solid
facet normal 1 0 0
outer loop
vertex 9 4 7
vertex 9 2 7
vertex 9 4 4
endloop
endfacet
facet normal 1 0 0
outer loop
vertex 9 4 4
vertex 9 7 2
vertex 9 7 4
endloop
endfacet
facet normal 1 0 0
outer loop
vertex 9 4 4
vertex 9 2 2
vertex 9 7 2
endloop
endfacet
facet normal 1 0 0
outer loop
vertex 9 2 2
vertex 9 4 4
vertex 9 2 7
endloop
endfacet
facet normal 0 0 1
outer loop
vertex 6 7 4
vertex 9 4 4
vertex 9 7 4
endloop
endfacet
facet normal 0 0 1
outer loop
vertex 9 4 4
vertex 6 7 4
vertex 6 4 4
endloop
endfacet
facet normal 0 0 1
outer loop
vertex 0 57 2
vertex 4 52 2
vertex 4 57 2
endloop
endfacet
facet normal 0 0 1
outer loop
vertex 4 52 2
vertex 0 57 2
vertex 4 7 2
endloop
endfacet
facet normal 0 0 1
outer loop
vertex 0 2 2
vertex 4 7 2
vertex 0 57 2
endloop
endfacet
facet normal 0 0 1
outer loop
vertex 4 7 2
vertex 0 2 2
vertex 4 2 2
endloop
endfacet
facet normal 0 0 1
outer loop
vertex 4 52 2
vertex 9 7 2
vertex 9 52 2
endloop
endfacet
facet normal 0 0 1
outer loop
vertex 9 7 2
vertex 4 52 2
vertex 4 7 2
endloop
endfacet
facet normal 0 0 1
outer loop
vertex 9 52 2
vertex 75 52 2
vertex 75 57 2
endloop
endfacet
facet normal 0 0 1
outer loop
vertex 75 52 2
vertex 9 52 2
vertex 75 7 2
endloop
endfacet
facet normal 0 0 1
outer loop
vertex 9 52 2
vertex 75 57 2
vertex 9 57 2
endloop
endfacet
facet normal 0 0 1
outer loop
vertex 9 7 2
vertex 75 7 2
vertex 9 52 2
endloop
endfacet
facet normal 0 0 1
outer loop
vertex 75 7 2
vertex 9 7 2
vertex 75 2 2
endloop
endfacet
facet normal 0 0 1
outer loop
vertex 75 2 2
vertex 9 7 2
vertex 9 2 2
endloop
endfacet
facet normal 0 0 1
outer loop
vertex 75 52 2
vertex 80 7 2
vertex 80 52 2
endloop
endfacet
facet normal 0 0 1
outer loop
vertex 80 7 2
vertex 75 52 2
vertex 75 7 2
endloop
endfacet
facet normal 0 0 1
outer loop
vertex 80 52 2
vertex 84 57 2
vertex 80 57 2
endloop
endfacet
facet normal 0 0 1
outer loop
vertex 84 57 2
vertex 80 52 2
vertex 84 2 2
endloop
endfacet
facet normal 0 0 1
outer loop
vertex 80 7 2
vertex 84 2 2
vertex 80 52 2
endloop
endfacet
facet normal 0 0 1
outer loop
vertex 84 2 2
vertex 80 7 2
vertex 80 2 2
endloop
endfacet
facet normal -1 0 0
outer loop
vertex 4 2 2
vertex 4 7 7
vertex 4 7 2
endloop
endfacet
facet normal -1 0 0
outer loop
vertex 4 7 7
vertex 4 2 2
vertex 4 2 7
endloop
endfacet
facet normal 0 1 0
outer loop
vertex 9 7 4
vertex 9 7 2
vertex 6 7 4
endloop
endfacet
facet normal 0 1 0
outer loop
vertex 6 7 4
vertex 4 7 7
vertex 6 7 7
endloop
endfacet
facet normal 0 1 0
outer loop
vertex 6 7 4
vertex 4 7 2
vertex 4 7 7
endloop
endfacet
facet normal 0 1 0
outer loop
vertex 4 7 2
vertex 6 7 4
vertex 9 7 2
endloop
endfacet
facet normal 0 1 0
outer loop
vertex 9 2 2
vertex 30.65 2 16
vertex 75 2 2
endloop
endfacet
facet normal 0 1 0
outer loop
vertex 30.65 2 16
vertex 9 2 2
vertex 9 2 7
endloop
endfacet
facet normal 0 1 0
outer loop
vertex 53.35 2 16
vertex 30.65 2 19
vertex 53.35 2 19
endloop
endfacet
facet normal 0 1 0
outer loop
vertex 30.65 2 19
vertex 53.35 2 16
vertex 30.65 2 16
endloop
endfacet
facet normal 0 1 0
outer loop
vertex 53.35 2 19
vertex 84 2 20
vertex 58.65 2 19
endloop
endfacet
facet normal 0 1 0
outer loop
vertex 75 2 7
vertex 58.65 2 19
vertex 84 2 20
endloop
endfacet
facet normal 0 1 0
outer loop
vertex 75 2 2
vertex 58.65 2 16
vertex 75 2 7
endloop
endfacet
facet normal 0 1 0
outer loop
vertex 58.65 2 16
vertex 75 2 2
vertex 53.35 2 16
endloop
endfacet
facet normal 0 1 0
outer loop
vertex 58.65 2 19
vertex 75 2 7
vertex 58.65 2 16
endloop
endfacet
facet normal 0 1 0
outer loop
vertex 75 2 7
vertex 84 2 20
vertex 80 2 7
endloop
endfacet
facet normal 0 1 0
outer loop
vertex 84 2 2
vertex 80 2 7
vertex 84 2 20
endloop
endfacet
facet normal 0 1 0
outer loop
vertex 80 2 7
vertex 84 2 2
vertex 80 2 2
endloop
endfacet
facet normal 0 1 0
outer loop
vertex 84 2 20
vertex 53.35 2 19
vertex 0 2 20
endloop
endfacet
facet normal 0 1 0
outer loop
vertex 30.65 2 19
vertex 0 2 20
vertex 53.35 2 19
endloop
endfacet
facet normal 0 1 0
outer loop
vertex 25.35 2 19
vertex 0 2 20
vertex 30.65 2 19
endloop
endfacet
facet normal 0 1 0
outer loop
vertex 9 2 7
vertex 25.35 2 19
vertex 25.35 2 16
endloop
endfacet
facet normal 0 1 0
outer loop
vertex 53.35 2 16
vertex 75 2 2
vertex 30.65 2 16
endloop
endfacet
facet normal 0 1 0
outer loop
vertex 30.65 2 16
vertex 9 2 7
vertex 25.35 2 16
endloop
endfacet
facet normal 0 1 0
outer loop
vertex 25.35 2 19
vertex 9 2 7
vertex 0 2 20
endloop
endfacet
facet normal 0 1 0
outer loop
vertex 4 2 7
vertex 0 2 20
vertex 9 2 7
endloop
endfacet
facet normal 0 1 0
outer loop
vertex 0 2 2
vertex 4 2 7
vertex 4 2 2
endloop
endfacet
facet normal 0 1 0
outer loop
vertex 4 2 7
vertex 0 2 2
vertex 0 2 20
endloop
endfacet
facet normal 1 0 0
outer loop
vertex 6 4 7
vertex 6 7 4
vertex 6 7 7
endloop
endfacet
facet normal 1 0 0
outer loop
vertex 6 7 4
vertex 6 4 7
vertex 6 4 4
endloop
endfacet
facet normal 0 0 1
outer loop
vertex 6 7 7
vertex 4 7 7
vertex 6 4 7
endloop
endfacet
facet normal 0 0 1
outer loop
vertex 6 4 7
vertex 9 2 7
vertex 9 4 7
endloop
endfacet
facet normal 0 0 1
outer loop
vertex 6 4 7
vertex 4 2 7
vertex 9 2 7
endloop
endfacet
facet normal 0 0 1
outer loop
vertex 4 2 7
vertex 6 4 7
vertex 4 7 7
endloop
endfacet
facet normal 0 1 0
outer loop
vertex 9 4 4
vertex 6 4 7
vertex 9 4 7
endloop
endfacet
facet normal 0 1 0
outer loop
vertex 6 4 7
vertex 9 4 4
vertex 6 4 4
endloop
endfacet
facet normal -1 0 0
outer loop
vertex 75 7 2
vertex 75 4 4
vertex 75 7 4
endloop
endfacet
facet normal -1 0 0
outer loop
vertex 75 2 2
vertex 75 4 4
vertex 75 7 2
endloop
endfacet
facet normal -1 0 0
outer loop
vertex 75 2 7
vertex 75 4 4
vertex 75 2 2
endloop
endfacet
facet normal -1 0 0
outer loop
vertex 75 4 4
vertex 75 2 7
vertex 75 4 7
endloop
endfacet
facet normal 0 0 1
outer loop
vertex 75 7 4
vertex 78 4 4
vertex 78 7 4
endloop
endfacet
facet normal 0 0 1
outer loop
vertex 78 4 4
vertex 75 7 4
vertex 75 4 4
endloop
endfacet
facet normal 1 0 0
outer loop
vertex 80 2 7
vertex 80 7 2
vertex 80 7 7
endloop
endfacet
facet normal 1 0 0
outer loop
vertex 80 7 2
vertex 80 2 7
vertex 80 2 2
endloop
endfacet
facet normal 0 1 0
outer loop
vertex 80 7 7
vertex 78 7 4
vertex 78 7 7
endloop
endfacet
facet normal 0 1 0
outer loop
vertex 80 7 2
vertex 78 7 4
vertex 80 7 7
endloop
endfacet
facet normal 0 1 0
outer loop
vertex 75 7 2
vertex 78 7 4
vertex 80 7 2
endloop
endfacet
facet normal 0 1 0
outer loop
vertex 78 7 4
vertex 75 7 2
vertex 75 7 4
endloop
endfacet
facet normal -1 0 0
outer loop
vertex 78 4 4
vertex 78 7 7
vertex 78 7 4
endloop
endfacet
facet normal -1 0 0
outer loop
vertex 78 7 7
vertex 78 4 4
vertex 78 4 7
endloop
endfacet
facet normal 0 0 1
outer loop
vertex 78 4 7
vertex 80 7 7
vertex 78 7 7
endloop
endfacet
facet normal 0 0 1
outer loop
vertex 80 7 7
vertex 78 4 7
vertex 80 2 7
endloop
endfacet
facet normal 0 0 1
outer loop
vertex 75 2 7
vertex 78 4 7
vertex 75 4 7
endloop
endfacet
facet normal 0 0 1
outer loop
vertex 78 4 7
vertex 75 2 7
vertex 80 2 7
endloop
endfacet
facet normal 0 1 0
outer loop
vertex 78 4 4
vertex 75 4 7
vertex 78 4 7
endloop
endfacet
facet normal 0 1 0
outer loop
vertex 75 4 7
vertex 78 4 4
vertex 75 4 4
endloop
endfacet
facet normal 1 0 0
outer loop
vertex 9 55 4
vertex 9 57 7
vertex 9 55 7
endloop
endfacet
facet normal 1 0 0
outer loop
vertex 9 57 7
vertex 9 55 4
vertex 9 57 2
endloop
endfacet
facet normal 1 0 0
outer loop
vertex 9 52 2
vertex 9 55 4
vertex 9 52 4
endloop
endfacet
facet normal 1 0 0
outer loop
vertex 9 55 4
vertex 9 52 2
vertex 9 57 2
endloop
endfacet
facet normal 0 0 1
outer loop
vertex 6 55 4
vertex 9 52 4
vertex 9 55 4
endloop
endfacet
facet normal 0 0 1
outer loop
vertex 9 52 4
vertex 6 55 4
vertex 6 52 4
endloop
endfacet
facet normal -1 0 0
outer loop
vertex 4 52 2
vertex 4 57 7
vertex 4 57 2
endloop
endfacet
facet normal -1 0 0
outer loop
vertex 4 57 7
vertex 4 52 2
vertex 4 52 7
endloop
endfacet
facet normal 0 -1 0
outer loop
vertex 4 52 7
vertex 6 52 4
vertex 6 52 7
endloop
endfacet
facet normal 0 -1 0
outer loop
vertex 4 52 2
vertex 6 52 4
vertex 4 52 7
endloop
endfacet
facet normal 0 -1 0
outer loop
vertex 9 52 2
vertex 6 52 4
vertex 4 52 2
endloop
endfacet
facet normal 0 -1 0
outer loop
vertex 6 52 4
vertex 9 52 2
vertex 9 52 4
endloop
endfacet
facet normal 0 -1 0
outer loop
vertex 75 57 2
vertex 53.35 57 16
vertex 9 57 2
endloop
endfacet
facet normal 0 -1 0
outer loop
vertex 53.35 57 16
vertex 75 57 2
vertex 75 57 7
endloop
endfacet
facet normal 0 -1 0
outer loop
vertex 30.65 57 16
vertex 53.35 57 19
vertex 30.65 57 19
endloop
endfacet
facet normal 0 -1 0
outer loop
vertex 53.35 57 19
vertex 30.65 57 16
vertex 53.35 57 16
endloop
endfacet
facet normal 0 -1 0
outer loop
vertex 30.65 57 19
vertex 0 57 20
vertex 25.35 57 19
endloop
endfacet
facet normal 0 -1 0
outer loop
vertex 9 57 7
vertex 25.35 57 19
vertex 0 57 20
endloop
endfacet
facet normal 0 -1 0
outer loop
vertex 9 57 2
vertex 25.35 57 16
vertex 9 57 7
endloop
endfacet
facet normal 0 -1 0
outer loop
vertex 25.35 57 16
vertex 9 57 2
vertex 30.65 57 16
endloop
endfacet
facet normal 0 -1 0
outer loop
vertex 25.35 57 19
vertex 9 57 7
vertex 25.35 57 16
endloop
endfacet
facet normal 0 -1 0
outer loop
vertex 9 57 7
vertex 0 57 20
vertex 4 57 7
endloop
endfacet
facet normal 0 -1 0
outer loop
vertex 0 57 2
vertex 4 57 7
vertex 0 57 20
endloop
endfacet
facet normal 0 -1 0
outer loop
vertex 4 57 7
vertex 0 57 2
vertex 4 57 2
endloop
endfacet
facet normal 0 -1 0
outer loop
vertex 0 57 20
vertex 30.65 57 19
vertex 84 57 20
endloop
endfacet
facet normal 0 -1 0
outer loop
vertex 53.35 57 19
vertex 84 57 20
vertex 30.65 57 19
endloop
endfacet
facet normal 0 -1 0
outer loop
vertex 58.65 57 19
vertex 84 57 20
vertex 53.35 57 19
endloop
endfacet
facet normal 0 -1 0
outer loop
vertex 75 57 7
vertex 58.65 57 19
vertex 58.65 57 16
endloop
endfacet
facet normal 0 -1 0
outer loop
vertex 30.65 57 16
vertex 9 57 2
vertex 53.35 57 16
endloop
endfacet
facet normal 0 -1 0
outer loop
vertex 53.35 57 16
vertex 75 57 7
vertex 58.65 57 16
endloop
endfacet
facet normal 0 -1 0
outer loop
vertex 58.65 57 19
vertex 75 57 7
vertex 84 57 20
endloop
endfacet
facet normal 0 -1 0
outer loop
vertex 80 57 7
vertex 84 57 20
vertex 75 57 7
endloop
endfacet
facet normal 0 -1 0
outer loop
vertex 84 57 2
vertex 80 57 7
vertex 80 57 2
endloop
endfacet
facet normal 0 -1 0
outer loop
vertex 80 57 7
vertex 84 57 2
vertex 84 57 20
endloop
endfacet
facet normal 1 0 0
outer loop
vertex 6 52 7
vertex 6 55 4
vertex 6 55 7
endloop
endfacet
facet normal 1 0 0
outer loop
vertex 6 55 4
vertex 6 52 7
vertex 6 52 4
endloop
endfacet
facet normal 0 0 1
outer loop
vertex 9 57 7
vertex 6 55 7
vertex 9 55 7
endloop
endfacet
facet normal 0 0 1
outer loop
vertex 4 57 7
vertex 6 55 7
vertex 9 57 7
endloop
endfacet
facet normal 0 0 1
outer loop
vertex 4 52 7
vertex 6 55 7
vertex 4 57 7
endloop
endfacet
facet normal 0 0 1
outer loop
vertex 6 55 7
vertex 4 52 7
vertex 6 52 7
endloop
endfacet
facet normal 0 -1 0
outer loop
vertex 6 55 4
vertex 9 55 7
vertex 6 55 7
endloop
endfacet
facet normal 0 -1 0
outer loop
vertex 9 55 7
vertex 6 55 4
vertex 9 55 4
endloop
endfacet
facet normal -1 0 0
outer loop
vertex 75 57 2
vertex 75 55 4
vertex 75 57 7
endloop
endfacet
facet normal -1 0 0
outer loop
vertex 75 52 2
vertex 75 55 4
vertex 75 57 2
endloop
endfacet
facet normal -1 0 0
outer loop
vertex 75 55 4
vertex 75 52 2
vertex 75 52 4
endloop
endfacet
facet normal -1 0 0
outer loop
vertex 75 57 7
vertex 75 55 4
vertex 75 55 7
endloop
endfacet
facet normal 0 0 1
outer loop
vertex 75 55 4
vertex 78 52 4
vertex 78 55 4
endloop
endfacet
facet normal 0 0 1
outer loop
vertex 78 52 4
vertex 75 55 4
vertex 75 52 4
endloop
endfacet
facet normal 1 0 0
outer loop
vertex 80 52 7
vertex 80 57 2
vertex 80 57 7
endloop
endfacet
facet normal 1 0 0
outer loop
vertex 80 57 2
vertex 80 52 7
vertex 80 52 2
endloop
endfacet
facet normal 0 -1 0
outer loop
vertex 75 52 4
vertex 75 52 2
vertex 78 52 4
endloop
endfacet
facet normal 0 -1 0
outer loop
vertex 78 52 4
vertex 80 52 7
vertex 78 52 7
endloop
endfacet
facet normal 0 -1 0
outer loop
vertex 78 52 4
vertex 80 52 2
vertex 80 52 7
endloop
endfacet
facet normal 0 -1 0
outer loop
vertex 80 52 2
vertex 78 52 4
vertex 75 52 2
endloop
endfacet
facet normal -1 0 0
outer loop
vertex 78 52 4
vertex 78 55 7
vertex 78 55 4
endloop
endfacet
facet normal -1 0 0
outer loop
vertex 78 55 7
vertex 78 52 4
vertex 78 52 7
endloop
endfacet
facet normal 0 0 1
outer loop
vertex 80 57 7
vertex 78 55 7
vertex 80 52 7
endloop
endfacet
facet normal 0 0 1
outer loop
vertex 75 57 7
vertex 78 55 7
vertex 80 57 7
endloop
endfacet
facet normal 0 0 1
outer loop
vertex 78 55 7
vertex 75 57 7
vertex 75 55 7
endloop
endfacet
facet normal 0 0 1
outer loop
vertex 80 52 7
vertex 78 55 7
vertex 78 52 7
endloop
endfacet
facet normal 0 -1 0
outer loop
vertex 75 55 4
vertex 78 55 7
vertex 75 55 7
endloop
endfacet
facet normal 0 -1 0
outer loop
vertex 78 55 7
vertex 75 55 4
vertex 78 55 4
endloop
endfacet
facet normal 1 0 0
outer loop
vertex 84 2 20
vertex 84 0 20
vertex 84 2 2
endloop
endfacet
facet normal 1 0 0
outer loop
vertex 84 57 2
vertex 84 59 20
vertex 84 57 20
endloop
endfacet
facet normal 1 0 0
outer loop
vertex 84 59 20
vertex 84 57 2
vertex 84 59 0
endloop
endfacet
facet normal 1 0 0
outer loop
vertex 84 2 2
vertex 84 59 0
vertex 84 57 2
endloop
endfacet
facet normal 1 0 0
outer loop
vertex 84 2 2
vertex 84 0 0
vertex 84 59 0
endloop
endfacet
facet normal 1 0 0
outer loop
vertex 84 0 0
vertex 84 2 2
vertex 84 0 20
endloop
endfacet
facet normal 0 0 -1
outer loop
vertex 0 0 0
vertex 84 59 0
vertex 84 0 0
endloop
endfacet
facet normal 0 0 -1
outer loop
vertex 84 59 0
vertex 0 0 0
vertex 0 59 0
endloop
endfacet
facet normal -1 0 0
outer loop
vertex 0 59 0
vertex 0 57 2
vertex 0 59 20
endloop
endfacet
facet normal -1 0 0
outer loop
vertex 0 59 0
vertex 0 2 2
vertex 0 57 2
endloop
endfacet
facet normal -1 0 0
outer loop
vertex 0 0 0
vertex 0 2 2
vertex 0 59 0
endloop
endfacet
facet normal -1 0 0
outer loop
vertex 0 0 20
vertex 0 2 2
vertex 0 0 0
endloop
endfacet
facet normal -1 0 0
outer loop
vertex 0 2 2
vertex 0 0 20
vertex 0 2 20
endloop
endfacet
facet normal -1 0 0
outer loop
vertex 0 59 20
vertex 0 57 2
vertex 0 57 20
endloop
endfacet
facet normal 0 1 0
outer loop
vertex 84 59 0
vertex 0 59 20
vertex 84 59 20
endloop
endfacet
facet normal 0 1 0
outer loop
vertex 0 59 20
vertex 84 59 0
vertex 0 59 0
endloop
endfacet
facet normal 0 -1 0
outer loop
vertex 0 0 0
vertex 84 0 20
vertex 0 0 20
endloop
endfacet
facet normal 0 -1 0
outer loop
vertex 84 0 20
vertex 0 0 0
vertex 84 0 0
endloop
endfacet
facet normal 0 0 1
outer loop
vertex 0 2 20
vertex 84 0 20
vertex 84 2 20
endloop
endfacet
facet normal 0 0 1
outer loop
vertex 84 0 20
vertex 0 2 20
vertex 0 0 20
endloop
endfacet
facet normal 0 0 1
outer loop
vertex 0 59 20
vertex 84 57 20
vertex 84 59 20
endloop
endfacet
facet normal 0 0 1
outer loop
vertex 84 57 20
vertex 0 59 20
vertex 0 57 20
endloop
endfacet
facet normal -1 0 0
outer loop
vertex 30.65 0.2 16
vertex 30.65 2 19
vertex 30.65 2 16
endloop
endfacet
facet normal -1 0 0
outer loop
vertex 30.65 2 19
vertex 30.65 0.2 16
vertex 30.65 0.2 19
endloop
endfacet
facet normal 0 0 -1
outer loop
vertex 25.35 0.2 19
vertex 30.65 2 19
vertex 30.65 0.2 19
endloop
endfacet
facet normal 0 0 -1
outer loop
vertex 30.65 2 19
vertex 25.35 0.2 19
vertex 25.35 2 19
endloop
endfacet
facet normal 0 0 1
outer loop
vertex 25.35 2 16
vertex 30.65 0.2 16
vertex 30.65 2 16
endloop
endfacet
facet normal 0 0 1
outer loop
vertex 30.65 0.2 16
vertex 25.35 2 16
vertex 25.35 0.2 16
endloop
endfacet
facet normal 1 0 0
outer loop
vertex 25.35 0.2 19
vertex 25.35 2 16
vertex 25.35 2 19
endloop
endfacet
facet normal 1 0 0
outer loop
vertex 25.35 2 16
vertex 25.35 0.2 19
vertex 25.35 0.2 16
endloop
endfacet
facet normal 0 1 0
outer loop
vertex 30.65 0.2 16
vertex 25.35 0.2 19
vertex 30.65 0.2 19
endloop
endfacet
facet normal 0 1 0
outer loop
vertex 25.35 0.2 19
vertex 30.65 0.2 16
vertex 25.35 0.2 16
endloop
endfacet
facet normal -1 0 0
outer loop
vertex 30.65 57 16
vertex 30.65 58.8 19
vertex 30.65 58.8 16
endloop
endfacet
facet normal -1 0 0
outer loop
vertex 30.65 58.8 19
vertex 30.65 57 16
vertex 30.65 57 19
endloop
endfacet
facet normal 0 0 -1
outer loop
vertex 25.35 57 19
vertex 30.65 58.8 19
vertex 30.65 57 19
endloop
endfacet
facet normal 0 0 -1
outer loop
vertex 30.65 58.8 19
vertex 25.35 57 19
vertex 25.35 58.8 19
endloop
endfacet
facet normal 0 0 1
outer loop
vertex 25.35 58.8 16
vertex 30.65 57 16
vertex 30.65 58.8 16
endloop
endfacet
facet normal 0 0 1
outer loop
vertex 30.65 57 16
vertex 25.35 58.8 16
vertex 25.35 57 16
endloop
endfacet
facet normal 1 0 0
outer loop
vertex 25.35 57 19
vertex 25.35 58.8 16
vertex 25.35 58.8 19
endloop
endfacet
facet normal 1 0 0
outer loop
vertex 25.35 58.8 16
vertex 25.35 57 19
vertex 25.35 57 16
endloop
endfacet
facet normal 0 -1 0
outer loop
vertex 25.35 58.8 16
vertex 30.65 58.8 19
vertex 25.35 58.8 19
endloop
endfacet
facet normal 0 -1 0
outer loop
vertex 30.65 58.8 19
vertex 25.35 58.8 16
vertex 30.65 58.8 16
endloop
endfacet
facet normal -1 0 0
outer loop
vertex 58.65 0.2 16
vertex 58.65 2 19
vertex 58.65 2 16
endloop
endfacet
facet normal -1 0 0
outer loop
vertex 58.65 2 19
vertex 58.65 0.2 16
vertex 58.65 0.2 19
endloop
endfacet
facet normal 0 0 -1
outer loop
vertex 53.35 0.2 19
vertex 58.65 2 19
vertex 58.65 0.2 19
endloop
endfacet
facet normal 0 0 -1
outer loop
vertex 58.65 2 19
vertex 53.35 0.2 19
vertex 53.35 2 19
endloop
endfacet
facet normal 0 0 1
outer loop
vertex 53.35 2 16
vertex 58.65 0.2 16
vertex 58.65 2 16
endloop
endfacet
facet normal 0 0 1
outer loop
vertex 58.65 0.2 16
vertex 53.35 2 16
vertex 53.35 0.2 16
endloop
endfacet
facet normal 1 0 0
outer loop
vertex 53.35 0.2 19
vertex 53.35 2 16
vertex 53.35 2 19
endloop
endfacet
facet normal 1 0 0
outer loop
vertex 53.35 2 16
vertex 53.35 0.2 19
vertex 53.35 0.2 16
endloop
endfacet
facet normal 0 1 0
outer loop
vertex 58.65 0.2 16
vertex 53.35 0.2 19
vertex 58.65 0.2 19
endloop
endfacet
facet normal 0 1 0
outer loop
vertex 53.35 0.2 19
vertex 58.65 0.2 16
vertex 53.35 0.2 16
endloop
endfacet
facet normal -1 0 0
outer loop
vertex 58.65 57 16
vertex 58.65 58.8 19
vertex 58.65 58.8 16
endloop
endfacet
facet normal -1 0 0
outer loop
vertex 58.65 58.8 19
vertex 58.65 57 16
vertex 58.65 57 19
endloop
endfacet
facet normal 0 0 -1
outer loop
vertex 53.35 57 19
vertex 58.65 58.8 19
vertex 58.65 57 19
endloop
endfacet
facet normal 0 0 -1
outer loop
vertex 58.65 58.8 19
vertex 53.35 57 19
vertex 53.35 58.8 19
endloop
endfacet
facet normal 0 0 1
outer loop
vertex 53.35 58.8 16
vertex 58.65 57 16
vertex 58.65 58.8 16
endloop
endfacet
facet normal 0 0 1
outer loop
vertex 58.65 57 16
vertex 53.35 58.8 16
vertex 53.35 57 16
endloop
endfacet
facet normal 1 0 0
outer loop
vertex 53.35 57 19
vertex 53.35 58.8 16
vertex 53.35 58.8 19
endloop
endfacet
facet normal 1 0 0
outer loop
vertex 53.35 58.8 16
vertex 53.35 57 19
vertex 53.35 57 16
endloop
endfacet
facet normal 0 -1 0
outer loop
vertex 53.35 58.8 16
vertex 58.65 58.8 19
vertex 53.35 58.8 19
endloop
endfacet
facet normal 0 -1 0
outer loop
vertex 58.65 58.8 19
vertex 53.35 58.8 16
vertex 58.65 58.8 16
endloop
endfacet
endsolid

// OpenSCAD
// ============================================
// TPA3116 Amplifier Enclosure — Parametric Design
// ============================================

// --- PCB Dimensions ---
pcb_length = 79;        // X axis (mm)
pcb_width = 54;         // Y axis (mm)
pcb_height = 16;        // Z axis — total height including components
pcb_tolerance = 0.5;    // clearance per side

// --- Enclosure ---
wall_thickness = 2;
standoff_height = 2;    // PCB bottom clearance (ledge height)
top_clearance = 2;      // above tallest component to lid

// --- Derived internal dimensions ---
inner_length = pcb_length + 2 * pcb_tolerance;  // 80
inner_width = pcb_width + 2 * pcb_tolerance;    // 55
inner_height = standoff_height + pcb_height + top_clearance; // 20

// --- Derived external dimensions ---
outer_length = inner_length + 2 * wall_thickness;  // 84
outer_width = inner_width + 2 * wall_thickness;    // 59
tray_height = inner_height;  // 20 (walls go full inner height)

// --- Snap-fit clips ---
clip_width = 5;
clip_height = 3;
clip_hook_depth = 1.5;
clip_tolerance = 0.3;
clip_recess_z_from_top = 1;  // recess starts 1mm below wall top

// --- Derived clip positions (shared between tray recesses and lid hooks) ---
clip_center_x1 = outer_length / 3;
clip_center_x2 = 2 * outer_length / 3;

// --- Ventilation ---
vent_x_offset = 22;     // from front edge of inner cavity
vent_y_offset = 14;     // from left edge of inner cavity
vent_length = 30;       // along X
vent_width = 25;        // along Y
slot_width = 1.5;
bridge_width = 1.5;
num_slots = 8;
// Center slots within grille area
vent_slots_total = num_slots * slot_width + (num_slots - 1) * bridge_width; // 22.5
vent_start_offset = (vent_length - vent_slots_total) / 2;  // 3.75

// --- Lid ---
lid_thickness = 2;
lid_lip_depth = 4;       // inner lip descends 4mm (fits clip_height + recess_z_from_top)
lid_lip_thickness = 1.5;

// --- PCB corner supports ---
support_ledge_width = 2;   // shelf under PCB
support_wall_height = 3;   // side wall gripping PCB
support_inset = 2;         // distance from open face edges
support_size = 5;          // footprint of each L-support along X and Y

// --- Print layout ---
print_gap = 10;  // gap between parts in print layout

// ============================================
// PCB CORNER SUPPORTS
// ============================================

// Single L-shaped corner support — models front-left corner
// Grip walls face +X and +Y (inward toward PCB center)
// Origin: outer corner of the support footprint
module corner_support() {
    // Ledge (shelf under PCB)
    cube([support_size, support_size, standoff_height]);
    // Grip wall along Y (faces +X, grips PCB X-edge)
    cube([support_ledge_width, support_size, standoff_height + support_wall_height]);
    // Grip wall along X (faces +Y, grips PCB Y-edge)
    cube([support_size, support_ledge_width, standoff_height + support_wall_height]);
}

module pcb_corner_supports() {
    // PCB cavity origin: (wall_thickness, wall_thickness)
    // Supports inset from open faces by support_inset
    x_inner_min = wall_thickness + support_inset;
    x_inner_max = wall_thickness + inner_length - support_inset;
    y_inner_min = wall_thickness;
    y_inner_max = wall_thickness + inner_width;

    // Front-left: grip walls face +X, +Y (default orientation)
    translate([x_inner_min, y_inner_min, wall_thickness])
        corner_support();

    // Back-left: grip walls face -X, +Y (mirror on X)
    translate([x_inner_max, y_inner_min, wall_thickness])
        mirror([1, 0, 0])
            corner_support();

    // Front-right: grip walls face +X, -Y (mirror on Y)
    translate([x_inner_min, y_inner_max, wall_thickness])
        mirror([0, 1, 0])
            corner_support();

    // Back-right: grip walls face -X, -Y (mirror on X and Y)
    translate([x_inner_max, y_inner_max, wall_thickness])
        mirror([1, 0, 0])
            mirror([0, 1, 0])
                corner_support();
}

// ============================================
// CLIP RECESSES
// ============================================
module clip_recesses() {
    recess_width = clip_width + clip_tolerance;
    recess_height = clip_height;
    recess_depth = clip_hook_depth + clip_tolerance;

    // Z position: top of wall minus offset minus height
    recess_z = tray_height - clip_recess_z_from_top - recess_height;

    // X positions: centered on shared clip center points
    for (cx = [clip_center_x1, clip_center_x2]) {
        x_pos = cx - recess_width / 2;

        // Left wall (Y=0): recess on inner face
        translate([x_pos, wall_thickness - recess_depth, recess_z])
            cube([recess_width, recess_depth, recess_height]);

        // Right wall (Y=max): recess on inner face
        translate([x_pos, outer_width - wall_thickness, recess_z])
            cube([recess_width, recess_depth, recess_height]);
    }
}

// ============================================
// TRAY MODULE
// ============================================
module tray() {
    difference() {
        union() {
            // Base plate extends under walls (spec's 84x55 is the exposed floor area)
            cube([outer_length, outer_width, wall_thickness]);

            // Left wall (Y=0 side)
            cube([outer_length, wall_thickness, tray_height]);

            // Right wall (Y=max side)
            translate([0, outer_width - wall_thickness, 0])
                cube([outer_length, wall_thickness, tray_height]);

            // PCB corner supports
            pcb_corner_supports();
        }
        // Clip recess cutouts
        clip_recesses();
    }
}

// Preview
tray();
